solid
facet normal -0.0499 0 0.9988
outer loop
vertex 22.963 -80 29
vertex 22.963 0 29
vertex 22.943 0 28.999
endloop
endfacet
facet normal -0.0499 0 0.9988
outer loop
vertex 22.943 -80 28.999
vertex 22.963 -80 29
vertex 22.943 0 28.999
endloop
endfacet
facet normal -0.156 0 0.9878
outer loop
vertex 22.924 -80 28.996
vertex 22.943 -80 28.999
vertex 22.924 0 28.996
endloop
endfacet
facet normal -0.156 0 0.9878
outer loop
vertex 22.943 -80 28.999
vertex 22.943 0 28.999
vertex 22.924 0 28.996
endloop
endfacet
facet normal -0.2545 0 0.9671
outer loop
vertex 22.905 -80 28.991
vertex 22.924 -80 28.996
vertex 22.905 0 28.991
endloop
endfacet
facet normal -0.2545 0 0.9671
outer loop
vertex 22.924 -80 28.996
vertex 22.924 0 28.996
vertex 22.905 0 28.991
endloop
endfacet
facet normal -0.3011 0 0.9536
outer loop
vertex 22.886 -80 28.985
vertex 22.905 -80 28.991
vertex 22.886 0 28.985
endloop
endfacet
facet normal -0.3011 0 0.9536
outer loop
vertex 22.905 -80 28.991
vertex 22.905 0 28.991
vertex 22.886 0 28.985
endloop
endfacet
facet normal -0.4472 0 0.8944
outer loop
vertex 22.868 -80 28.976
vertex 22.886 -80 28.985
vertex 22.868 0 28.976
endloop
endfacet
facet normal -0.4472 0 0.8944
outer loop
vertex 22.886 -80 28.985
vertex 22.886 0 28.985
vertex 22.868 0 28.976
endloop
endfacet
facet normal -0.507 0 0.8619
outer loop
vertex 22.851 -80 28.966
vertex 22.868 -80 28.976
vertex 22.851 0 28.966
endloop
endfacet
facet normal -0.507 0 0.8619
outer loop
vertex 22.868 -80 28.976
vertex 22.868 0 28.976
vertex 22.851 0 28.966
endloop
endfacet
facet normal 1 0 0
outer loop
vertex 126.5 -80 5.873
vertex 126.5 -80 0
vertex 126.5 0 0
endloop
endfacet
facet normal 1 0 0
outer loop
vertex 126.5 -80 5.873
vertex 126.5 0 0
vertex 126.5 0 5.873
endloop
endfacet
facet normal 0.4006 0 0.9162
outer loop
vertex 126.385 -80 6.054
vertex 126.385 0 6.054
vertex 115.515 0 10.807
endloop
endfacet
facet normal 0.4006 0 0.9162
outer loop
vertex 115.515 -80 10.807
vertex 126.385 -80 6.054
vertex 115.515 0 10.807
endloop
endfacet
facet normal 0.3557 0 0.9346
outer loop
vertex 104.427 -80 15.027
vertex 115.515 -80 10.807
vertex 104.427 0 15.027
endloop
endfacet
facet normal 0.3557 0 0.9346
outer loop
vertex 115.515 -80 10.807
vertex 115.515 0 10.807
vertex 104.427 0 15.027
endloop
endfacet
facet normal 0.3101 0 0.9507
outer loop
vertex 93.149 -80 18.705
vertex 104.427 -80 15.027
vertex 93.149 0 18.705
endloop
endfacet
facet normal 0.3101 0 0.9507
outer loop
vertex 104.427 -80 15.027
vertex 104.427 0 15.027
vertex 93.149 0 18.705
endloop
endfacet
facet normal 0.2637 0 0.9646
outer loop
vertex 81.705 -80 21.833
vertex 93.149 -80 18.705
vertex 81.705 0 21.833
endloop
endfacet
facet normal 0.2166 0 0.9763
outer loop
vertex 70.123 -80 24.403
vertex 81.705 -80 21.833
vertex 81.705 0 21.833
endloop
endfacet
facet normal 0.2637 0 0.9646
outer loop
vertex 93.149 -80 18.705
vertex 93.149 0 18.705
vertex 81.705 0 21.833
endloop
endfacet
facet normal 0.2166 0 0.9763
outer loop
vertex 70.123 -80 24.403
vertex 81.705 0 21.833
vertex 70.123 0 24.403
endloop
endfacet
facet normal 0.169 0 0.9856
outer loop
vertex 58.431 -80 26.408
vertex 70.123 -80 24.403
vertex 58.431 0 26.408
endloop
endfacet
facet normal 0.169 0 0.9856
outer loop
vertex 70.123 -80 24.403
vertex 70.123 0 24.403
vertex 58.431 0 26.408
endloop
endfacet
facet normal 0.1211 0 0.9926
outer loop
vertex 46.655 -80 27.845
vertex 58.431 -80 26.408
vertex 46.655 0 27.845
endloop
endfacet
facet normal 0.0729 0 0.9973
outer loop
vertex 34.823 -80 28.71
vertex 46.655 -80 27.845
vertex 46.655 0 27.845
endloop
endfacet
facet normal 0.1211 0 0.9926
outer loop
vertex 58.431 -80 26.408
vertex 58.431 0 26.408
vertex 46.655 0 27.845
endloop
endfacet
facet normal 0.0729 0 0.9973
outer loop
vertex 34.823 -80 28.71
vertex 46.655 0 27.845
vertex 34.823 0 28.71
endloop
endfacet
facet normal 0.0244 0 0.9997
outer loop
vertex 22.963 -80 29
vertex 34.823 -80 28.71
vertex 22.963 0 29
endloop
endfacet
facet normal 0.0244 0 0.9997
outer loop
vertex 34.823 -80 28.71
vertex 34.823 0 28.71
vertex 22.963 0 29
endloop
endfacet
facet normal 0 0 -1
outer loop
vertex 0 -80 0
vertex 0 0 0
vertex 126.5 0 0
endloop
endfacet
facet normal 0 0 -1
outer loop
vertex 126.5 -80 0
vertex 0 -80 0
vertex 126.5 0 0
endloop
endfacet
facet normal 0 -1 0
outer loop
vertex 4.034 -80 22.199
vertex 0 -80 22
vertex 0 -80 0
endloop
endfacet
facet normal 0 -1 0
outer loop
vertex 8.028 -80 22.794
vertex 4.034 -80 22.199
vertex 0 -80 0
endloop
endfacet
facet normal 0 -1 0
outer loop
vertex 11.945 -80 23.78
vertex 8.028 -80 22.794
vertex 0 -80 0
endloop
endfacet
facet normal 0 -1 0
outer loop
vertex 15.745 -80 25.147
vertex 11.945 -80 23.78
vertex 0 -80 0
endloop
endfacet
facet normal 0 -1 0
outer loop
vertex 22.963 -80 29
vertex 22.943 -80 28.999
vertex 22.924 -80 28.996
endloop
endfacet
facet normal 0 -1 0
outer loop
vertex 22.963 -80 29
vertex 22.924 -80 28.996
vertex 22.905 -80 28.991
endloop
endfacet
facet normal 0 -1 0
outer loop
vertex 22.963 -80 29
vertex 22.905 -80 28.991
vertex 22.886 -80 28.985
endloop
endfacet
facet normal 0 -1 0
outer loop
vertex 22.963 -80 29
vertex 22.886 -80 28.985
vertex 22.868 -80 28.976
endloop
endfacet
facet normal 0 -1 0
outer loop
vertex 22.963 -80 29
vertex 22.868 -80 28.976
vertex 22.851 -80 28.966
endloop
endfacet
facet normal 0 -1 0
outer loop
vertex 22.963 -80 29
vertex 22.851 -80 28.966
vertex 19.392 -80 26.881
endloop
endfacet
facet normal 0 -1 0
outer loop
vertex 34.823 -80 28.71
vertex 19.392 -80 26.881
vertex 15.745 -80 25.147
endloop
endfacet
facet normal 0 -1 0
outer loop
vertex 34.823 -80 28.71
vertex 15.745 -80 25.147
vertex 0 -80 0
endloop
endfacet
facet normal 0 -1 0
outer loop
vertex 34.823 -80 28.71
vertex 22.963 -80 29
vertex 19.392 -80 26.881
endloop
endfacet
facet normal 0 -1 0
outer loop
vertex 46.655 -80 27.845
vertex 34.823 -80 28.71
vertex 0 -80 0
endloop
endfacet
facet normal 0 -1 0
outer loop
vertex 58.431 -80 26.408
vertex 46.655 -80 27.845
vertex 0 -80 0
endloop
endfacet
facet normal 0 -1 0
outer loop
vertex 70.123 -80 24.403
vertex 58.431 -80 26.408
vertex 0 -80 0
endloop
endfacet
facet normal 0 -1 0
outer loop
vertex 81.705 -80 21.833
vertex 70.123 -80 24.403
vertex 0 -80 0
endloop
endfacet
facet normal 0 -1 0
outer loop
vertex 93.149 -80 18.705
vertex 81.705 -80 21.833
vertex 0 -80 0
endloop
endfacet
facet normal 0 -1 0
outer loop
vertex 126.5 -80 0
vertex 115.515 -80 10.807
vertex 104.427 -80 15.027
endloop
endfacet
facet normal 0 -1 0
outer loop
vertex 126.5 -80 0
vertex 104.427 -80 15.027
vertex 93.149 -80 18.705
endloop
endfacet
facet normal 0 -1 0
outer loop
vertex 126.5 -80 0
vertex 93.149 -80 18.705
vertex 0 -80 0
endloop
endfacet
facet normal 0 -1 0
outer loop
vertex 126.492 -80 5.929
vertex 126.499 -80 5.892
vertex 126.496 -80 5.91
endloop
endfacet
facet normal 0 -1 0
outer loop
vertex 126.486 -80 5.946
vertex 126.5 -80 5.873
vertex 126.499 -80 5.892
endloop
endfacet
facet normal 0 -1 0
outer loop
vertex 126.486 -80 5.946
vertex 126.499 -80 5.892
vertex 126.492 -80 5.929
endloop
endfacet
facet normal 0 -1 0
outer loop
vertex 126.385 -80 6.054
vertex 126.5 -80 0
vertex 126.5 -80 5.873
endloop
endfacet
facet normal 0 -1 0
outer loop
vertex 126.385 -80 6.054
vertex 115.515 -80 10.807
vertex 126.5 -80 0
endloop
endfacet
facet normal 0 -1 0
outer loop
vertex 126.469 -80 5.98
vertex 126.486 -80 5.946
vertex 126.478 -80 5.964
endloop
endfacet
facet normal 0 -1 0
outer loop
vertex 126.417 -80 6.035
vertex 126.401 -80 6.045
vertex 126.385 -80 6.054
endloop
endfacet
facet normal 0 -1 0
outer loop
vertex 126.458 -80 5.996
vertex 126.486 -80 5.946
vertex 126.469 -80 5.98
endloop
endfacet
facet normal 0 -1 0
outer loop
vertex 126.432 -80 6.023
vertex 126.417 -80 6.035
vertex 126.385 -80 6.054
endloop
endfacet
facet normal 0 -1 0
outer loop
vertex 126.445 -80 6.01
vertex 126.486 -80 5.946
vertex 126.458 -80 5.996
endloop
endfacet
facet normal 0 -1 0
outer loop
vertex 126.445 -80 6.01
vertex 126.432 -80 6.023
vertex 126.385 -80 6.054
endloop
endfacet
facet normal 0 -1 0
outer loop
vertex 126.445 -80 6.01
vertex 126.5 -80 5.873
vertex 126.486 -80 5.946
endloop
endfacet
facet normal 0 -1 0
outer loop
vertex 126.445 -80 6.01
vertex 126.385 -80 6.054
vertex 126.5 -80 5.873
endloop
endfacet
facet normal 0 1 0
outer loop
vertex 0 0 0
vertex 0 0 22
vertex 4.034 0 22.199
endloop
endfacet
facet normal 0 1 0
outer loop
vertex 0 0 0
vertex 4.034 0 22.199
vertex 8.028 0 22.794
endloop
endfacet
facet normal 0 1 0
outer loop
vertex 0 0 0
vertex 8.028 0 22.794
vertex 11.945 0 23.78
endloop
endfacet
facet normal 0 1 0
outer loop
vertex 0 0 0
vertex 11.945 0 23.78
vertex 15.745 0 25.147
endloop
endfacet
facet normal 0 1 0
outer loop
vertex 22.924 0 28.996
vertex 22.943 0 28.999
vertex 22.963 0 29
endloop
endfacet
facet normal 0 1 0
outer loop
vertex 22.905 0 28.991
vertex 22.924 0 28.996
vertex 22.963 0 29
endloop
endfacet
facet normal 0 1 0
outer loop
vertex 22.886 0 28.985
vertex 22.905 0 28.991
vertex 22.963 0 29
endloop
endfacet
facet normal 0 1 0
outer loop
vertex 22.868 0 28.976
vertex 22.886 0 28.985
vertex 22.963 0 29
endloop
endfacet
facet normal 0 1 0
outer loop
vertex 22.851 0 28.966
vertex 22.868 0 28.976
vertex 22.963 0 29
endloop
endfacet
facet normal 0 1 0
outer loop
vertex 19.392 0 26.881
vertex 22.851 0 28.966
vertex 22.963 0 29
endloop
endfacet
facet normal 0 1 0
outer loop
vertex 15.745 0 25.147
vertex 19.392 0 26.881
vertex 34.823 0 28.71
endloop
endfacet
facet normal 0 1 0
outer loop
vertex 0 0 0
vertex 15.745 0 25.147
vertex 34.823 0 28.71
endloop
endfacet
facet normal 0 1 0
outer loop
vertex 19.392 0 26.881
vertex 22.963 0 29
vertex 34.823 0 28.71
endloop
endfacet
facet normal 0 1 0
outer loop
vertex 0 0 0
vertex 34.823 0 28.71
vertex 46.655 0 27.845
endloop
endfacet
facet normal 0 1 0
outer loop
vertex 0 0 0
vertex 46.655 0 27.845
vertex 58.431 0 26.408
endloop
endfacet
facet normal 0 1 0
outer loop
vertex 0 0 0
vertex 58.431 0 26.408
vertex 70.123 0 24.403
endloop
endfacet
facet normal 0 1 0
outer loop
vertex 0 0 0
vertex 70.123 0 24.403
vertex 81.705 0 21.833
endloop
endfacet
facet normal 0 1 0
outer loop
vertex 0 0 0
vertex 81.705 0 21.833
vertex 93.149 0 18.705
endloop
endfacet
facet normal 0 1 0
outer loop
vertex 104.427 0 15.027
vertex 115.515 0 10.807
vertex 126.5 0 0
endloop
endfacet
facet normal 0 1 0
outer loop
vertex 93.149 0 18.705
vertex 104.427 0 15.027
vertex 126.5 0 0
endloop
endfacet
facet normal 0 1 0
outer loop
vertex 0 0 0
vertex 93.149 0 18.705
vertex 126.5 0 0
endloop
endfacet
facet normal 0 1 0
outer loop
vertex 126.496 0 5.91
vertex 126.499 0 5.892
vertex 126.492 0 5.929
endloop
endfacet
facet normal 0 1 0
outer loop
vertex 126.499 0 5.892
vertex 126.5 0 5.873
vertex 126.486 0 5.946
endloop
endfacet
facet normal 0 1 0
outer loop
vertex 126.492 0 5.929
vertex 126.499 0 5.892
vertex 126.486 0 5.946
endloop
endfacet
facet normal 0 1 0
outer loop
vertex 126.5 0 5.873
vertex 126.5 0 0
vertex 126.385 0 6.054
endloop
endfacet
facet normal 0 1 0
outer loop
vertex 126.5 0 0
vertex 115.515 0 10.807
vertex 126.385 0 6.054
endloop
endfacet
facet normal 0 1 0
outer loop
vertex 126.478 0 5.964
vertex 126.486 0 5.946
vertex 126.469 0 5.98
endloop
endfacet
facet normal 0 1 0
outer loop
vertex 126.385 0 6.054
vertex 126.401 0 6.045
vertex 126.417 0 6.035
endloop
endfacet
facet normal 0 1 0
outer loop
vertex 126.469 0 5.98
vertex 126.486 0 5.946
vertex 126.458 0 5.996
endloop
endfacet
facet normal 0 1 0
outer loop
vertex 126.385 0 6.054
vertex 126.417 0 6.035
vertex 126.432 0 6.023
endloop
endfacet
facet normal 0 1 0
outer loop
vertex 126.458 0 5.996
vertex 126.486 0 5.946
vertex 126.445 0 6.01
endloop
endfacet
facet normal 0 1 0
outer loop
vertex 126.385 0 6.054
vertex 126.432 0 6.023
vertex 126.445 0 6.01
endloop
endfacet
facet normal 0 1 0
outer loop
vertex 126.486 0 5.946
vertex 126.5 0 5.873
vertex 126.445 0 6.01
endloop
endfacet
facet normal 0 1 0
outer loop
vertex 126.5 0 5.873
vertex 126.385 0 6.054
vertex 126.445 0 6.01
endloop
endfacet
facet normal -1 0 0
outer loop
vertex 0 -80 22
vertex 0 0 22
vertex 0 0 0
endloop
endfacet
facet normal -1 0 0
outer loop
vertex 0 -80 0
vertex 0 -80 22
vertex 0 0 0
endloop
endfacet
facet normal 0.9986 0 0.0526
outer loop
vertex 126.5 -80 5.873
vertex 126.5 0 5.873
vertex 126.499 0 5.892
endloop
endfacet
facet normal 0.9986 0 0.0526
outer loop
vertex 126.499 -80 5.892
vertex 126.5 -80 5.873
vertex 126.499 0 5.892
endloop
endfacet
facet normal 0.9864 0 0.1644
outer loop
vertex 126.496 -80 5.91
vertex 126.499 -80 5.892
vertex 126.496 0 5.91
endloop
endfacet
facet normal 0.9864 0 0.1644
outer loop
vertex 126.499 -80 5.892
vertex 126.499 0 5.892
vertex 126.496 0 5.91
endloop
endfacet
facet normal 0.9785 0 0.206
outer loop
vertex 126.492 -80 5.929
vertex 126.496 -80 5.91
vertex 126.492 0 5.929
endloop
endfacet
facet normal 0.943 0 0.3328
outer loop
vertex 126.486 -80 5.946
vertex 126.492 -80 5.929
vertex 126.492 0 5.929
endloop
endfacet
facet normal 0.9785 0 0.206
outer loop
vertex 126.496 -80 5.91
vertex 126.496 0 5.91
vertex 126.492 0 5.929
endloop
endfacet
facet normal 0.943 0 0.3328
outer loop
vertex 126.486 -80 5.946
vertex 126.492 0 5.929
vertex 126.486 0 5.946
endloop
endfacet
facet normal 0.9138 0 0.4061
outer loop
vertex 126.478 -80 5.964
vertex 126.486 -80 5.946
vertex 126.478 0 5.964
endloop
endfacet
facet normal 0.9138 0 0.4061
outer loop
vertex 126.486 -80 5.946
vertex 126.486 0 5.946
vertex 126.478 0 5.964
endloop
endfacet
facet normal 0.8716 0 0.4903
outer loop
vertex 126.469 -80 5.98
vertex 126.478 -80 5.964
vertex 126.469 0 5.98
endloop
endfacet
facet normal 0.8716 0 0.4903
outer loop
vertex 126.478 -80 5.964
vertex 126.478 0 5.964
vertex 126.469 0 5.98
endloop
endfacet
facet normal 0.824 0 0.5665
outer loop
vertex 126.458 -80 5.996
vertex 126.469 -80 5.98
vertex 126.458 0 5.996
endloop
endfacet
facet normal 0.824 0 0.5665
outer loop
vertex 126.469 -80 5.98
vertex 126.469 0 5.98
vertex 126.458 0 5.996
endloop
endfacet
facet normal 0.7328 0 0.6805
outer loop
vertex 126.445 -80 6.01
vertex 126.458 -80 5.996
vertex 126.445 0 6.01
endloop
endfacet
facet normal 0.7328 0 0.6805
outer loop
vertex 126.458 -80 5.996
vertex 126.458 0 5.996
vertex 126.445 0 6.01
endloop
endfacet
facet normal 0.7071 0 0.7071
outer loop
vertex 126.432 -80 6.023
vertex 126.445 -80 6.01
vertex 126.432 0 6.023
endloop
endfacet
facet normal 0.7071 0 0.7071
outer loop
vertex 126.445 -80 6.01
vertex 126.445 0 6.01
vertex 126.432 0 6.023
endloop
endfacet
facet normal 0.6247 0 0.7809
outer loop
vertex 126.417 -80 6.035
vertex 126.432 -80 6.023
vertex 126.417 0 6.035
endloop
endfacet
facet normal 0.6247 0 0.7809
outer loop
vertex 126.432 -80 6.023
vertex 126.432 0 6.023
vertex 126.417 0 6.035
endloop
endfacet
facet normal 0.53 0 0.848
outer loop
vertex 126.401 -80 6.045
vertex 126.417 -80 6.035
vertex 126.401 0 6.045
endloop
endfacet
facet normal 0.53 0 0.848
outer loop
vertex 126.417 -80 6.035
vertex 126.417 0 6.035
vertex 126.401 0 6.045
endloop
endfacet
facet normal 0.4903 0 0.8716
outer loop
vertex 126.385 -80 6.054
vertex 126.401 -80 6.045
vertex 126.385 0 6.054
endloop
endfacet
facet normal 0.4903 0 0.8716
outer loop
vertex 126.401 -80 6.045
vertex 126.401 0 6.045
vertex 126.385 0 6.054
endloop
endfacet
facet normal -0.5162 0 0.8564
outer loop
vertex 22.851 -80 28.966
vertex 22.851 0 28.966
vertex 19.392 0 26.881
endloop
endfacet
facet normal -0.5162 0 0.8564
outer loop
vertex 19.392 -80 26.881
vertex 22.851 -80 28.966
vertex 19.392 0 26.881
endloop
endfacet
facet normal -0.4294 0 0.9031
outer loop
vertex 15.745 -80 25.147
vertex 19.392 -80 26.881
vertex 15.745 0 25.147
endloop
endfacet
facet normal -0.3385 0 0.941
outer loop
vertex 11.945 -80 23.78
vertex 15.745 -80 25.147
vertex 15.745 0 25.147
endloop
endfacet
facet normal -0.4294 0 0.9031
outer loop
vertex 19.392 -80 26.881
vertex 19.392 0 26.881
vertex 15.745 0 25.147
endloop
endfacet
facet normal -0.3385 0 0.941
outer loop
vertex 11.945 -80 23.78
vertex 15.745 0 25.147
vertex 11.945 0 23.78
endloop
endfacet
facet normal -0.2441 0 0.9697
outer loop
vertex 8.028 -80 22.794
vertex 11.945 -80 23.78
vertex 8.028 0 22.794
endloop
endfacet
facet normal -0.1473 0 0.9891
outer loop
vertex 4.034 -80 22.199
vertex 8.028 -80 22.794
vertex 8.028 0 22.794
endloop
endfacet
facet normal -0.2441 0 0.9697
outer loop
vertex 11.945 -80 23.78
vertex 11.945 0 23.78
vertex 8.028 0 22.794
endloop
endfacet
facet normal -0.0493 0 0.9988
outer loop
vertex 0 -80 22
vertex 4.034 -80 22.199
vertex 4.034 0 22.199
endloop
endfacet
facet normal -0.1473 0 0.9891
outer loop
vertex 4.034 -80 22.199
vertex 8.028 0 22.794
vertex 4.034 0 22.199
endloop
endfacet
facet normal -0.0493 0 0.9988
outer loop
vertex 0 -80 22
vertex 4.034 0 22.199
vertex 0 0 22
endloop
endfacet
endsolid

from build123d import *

# Parameters (mm, degrees)
F1_DEPTH = 80


# Not quite as in the source:
# - ends of sketch curves that miss each other by under 0.0002 mm in the source are joined


with BuildPart() as f1:
    # F0 (on Front) → F1 (new body)
    with BuildSketch(Plane.XZ):
        with BuildLine():
            Line((0, 20), (0, 0))
            Line((0, 0), (126.5, 0))
            Line((126.5, 0), (126.5, 5.872634))
            ThreePointArc((126.5, 5.872634), (126.4686827703, 5.9800868873), (126.3845387701, 6.0538885071))
            ThreePointArc((126.3845387701, 6.0538885071), (75.9297421053, 23.1880267358), (22.962901, 28.9999923785))
            ThreePointArc((22.962901, 28.9999923785), (22.9045566452, 28.9913078859), (22.8512831377, 28.9659817952))
            ThreePointArc((22.8512831377, 28.9659817952), (11.9447272771, 23.7801763601), (0, 22))
            Line((0, 22), (0, 20))
        make_face()
    extrude(amount=F1_DEPTH)


solid = f1.part
